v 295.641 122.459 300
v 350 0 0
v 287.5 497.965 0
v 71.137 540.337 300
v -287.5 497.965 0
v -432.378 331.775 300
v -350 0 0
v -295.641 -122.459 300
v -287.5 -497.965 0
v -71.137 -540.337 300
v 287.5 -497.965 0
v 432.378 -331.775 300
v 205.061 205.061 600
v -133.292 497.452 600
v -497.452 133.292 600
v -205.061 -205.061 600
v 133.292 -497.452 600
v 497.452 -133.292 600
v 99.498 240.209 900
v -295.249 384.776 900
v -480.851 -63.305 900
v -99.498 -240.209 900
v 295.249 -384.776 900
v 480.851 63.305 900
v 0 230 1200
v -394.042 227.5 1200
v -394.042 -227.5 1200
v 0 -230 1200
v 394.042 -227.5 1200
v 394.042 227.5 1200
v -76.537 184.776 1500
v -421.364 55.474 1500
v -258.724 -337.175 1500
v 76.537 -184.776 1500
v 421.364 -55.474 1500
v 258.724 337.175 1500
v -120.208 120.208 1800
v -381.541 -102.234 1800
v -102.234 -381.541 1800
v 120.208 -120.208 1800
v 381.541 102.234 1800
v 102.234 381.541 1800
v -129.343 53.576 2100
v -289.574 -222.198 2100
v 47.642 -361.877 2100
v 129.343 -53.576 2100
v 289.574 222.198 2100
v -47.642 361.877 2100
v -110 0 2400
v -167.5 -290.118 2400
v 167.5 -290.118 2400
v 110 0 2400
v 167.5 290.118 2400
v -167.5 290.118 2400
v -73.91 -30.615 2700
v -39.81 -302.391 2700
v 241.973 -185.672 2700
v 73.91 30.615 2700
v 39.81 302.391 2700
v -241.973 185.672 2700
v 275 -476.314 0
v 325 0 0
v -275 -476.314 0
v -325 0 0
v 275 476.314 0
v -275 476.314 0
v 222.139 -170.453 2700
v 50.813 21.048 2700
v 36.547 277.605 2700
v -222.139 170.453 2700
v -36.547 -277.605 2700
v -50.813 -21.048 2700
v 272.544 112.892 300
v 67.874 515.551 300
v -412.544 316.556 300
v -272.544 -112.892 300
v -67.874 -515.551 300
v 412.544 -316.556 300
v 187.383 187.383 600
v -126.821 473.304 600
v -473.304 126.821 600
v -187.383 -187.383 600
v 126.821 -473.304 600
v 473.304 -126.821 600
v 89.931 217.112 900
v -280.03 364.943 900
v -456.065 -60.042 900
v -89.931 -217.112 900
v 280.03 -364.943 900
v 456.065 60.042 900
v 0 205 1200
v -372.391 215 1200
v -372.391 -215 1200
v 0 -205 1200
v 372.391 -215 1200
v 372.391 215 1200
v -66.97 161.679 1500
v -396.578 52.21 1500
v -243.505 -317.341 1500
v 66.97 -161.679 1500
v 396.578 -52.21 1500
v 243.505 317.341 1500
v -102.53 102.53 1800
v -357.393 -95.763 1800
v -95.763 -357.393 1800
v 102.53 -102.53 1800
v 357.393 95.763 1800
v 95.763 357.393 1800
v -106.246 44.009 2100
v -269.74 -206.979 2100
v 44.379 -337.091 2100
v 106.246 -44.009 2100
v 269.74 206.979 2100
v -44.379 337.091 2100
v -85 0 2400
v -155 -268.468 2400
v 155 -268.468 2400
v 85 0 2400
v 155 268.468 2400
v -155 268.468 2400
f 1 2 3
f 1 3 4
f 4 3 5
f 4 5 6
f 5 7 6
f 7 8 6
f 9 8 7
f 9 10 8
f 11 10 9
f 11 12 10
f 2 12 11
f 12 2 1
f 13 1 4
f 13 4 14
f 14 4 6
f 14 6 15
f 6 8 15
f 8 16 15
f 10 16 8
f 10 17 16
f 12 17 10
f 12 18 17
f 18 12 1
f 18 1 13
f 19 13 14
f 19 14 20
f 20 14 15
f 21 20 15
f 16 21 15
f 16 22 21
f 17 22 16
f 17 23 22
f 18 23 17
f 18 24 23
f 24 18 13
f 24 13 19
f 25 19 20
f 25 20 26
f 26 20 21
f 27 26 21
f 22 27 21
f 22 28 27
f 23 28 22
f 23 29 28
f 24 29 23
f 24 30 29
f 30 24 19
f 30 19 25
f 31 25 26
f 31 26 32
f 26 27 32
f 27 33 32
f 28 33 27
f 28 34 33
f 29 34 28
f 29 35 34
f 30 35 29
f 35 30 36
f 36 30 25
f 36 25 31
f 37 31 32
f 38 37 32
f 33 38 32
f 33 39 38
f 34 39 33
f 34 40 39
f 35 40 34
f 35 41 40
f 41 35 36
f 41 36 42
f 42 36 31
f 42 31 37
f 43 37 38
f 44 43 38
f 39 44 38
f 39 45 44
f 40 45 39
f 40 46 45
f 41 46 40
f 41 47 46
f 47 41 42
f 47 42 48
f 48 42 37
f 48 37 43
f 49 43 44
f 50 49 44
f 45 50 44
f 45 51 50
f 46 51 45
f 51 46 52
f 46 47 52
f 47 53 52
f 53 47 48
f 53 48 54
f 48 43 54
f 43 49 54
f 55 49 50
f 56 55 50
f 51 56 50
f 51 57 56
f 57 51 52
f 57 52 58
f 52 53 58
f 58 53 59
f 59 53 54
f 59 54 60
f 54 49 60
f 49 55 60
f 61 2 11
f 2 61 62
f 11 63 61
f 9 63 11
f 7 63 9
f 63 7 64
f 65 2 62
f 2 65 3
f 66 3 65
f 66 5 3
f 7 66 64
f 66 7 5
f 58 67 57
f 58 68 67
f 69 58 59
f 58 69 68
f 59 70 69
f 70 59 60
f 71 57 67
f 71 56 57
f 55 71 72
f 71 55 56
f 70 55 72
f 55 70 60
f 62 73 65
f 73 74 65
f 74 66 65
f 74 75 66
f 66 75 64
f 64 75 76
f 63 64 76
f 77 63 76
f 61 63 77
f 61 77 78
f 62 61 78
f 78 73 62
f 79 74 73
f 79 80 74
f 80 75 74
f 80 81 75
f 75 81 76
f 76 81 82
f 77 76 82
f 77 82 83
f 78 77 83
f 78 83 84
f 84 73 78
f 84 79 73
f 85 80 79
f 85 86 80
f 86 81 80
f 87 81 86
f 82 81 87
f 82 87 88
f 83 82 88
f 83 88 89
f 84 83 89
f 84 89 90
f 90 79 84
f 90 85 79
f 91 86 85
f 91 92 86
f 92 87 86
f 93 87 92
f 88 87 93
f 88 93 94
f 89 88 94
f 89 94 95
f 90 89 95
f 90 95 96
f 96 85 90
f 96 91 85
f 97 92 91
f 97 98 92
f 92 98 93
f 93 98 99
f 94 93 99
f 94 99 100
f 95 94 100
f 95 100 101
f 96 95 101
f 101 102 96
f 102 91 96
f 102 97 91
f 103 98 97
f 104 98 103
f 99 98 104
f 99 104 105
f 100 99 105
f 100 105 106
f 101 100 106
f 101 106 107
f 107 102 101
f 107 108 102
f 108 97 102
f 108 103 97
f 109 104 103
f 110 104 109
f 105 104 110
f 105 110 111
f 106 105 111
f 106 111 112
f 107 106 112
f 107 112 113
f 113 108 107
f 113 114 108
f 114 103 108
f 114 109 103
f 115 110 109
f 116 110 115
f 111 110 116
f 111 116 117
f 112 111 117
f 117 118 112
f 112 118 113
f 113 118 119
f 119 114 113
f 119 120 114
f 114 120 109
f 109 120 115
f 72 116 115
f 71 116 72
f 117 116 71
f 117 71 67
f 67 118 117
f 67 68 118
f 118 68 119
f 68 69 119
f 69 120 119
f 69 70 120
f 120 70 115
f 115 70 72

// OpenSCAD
difference() {
	polyhedron(faces = [[0, 6, 1], [1, 6, 7], [1, 7, 2], [2, 7, 8], [2, 8, 3], [3, 8, 9], [3, 9, 4], [4, 9, 10], [4, 10, 5], [5, 10, 11], [5, 11, 0], [0, 11, 6], [6, 12, 7], [7, 12, 13], [7, 13, 8], [8, 13, 14], [8, 14, 9], [9, 14, 15], [9, 15, 10], [10, 15, 16], [10, 16, 11], [11, 16, 17], [11, 17, 6], [6, 17, 12], [12, 18, 13], [13, 18, 19], [13, 19, 14], [14, 19, 20], [14, 20, 15], [15, 20, 21], [15, 21, 16], [16, 21, 22], [16, 22, 17], [17, 22, 23], [17, 23, 12], [12, 23, 18], [18, 24, 19], [19, 24, 25], [19, 25, 20], [20, 25, 26], [20, 26, 21], [21, 26, 27], [21, 27, 22], [22, 27, 28], [22, 28, 23], [23, 28, 29], [23, 29, 18], [18, 29, 24], [24, 30, 25], [25, 30, 31], [25, 31, 26], [26, 31, 32], [26, 32, 27], [27, 32, 33], [27, 33, 28], [28, 33, 34], [28, 34, 29], [29, 34, 35], [29, 35, 24], [24, 35, 30], [30, 36, 31], [31, 36, 37], [31, 37, 32], [32, 37, 38], [32, 38, 33], [33, 38, 39], [33, 39, 34], [34, 39, 40], [34, 40, 35], [35, 40, 41], [35, 41, 30], [30, 41, 36], [36, 42, 37], [37, 42, 43], [37, 43, 38], [38, 43, 44], [38, 44, 39], [39, 44, 45], [39, 45, 40], [40, 45, 46], [40, 46, 41], [41, 46, 47], [41, 47, 36], [36, 47, 42], [42, 48, 43], [43, 48, 49], [43, 49, 44], [44, 49, 50], [44, 50, 45], [45, 50, 51], [45, 51, 46], [46, 51, 52], [46, 52, 47], [47, 52, 53], [47, 53, 42], [42, 53, 48], [48, 54, 49], [49, 54, 55], [49, 55, 50], [50, 55, 56], [50, 56, 51], [51, 56, 57], [51, 57, 52], [52, 57, 58], [52, 58, 53], [53, 58, 59], [53, 59, 48], [48, 59, 54], [1, 60, 0], [54, 61, 55], [2, 60, 1], [55, 61, 56], [3, 60, 2], [56, 61, 57], [4, 60, 3], [57, 61, 58], [5, 60, 4], [58, 61, 59], [0, 60, 5], [59, 61, 54]], points = [[350.0000000000, 0.0000000000, 0.0000000000], [287.5000000000, 497.9646071761, 0.0000000000], [-287.5000000000, 497.9646071761, 0.0000000000], [-350.0000000000, 0.0000000000, 0.0000000000], [-287.5000000000, -497.9646071761, 0.0000000000], [287.5000000000, -497.9646071761, 0.0000000000], [295.6414504036, 122.4586983568, 300.0000000000], [71.1367747599, 540.3374494487, 300.0000000000], [-432.3775704587, 331.7749788098, 300.0000000000], [-295.6414504036, -122.4586983568, 300.0000000000], [-71.1367747599, -540.3374494487, 300.0000000000], [432.3775704587, -331.7749788098, 300.0000000000], [205.0609665441, 205.0609665441, 600.0000000000], [-133.2918082278, 497.4518005389, 600.0000000000], [-497.4518005389, 133.2918082278, 600.0000000000], [-205.0609665441, -205.0609665441, 600.0000000000], [133.2918082278, -497.4518005389, 600.0000000000], [497.4518005389, -133.2918082278, 600.0000000000], [99.4976924149, 240.2086784529, 900.0000000000], [-295.2492930692, 384.7763700412, 900.0000000000], [-480.8507577663, -63.3052032267, 900.0000000000], [-99.4976924149, -240.2086784529, 900.0000000000], [295.2492930692, -384.7763700412, 900.0000000000], [480.8507577663, 63.3052032267, 900.0000000000], [0.0000000000, 230.0000000000, 1200.0000000000], [-394.0415587219, 227.5000000000, 1200.0000000000], [-394.0415587219, -227.5000000000, 1200.0000000000], [-0.0000000000, -230.0000000000, 1200.0000000000], [394.0415587219, -227.5000000000, 1200.0000000000], [394.0415587219, 227.5000000000, 1200.0000000000], [-76.5366864730, 184.7759065023, 1500.0000000000], [-421.3640660839, 55.4736316935, 1500.0000000000], [-258.7236073287, -337.1751696238, 1500.0000000000], [76.5366864730, -184.7759065023, 1500.0000000000], [421.3640660839, -55.4736316935, 1500.0000000000], [258.7236073287, 337.1751696238, 1500.0000000000], [-120.2081528017, 120.2081528017, 1800.0000000000], [-381.5407013842, -102.2335228155, 1800.0000000000], [-102.2335228155, -381.5407013842, 1800.0000000000], [120.2081528017, -120.2081528017, 1800.0000000000], [381.5407013842, 102.2335228155, 1800.0000000000], [102.2335228155, 381.5407013842, 1800.0000000000], [-129.3431345516, 53.5756805311, 2100.0000000000], [-289.5739692063, -222.1979215882, 2100.0000000000], [47.6420601603, -361.8773744014, 2100.0000000000], [129.3431345516, -53.5756805311, 2100.0000000000], [289.5739692063, 222.1979215882, 2100.0000000000], [-47.6420601603, 361.8773744014, 2100.0000000000], [-110.0000000000, 0.0000000000, 2400.0000000000], [-167.5000000000, -290.1185102678, 2400.0000000000], [167.5000000000, -290.1185102678, 2400.0000000000], [110.0000000000, -0.0000000000, 2400.0000000000], [167.5000000000, 290.1185102678, 2400.0000000000], [-167.5000000000, 290.1185102678, 2400.0000000000], [-73.9103626009, -30.6146745892, 2700.0000000000], [-39.8104886271, -302.3906827190, 2700.0000000000], [241.9727687888, -185.6722358477, 2700.0000000000], [73.9103626009, 30.6146745892, 2700.0000000000], [39.8104886271, 302.3906827190, 2700.0000000000], [-241.9727687888, 185.6722358477, 2700.0000000000], [-0.0000000000, 0.0000000000, 0.0000000000], [0.0000000000, 0.0000000000, 2700.0000000000]]);
	polyhedron(faces = [[0, 6, 1], [1, 6, 7], [1, 7, 2], [2, 7, 8], [2, 8, 3], [3, 8, 9], [3, 9, 4], [4, 9, 10], [4, 10, 5], [5, 10, 11], [5, 11, 0], [0, 11, 6], [6, 12, 7], [7, 12, 13], [7, 13, 8], [8, 13, 14], [8, 14, 9], [9, 14, 15], [9, 15, 10], [10, 15, 16], [10, 16, 11], [11, 16, 17], [11, 17, 6], [6, 17, 12], [12, 18, 13], [13, 18, 19], [13, 19, 14], [14, 19, 20], [14, 20, 15], [15, 20, 21], [15, 21, 16], [16, 21, 22], [16, 22, 17], [17, 22, 23], [17, 23, 12], [12, 23, 18], [18, 24, 19], [19, 24, 25], [19, 25, 20], [20, 25, 26], [20, 26, 21], [21, 26, 27], [21, 27, 22], [22, 27, 28], [22, 28, 23], [23, 28, 29], [23, 29, 18], [18, 29, 24], [24, 30, 25], [25, 30, 31], [25, 31, 26], [26, 31, 32], [26, 32, 27], [27, 32, 33], [27, 33, 28], [28, 33, 34], [28, 34, 29], [29, 34, 35], [29, 35, 24], [24, 35, 30], [30, 36, 31], [31, 36, 37], [31, 37, 32], [32, 37, 38], [32, 38, 33], [33, 38, 39], [33, 39, 34], [34, 39, 40], [34, 40, 35], [35, 40, 41], [35, 41, 30], [30, 41, 36], [36, 42, 37], [37, 42, 43], [37, 43, 38], [38, 43, 44], [38, 44, 39], [39, 44, 45], [39, 45, 40], [40, 45, 46], [40, 46, 41], [41, 46, 47], [41, 47, 36], [36, 47, 42], [42, 48, 43], [43, 48, 49], [43, 49, 44], [44, 49, 50], [44, 50, 45], [45, 50, 51], [45, 51, 46], [46, 51, 52], [46, 52, 47], [47, 52, 53], [47, 53, 42], [42, 53, 48], [48, 54, 49], [49, 54, 55], [49, 55, 50], [50, 55, 56], [50, 56, 51], [51, 56, 57], [51, 57, 52], [52, 57, 58], [52, 58, 53], [53, 58, 59], [53, 59, 48], [48, 59, 54], [1, 60, 0], [54, 61, 55], [2, 60, 1], [55, 61, 56], [3, 60, 2], [56, 61, 57], [4, 60, 3], [57, 61, 58], [5, 60, 4], [58, 61, 59], [0, 60, 5], [59, 61, 54]], points = [[325.0000000000, 0.0000000000, 0.0000000000], [275.0000000000, 476.3139720814, 0.0000000000], [-275.0000000000, 476.3139720814, 0.0000000000], [-325.0000000000, 0.0000000000, 0.0000000000], [-275.0000000000, -476.3139720814, 0.0000000000], [275.0000000000, -476.3139720814, 0.0000000000], [272.5444620908, 112.8916125477, 300.0000000000], [67.8736199544, 515.5513279144, 300.0000000000], [-412.5437369514, 316.5559430845, 300.0000000000], [-272.5444620908, -112.8916125477, 300.0000000000], [-67.8736199544, -515.5513279144, 300.0000000000], [412.5437369514, -316.5559430845, 300.0000000000], [187.3832970144, 187.3832970144, 600.0000000000], [-126.8213321002, 473.3036548816, 600.0000000000], [-473.3036548816, 126.8213321002, 600.0000000000], [-187.3832970144, -187.3832970144, 600.0000000000], [126.8213321002, -473.3036548816, 600.0000000000], [473.3036548816, -126.8213321002, 600.0000000000], [89.9306066058, 217.1116901402, 900.0000000000], [-280.0302573440, 364.9425365340, 900.0000000000], [-456.0646362320, -60.0420484212, 900.0000000000], [-89.9306066058, -217.1116901402, 900.0000000000], [280.0302573440, -364.9425365340, 900.0000000000], [456.0646362320, 60.0420484212, 900.0000000000], [0.0000000000, 205.0000000000, 1200.0000000000], [-372.3909236273, 215.0000000000, 1200.0000000000], [-372.3909236273, -215.0000000000, 1200.0000000000], [-0.0000000000, -205.0000000000, 1200.0000000000], [372.3909236273, -215.0000000000, 1200.0000000000], [372.3909236273, 215.0000000000, 1200.0000000000], [-66.9696006639, 161.6789181895, 1500.0000000000], [-396.5779445495, 52.2104768880, 1500.0000000000], [-243.5045716035, -317.3413361165, 1500.0000000000], [66.9696006639, -161.6789181895, 1500.0000000000], [396.5779445495, -52.2104768880, 1500.0000000000], [243.5045716035, 317.3413361165, 1500.0000000000], [-102.5304832720, 102.5304832720, 1800.0000000000], [-357.3925557270, -95.7630466879, 1800.0000000000], [-95.7630466879, -357.3925557270, 1800.0000000000], [102.5304832720, -102.5304832720, 1800.0000000000], [357.3925557270, 95.7630466879, 1800.0000000000], [95.7630466879, 357.3925557270, 1800.0000000000], [-106.2461462388, 44.0085947220, 2100.0000000000], [-269.7401356990, -206.9788858630, 2100.0000000000], [44.3789053548, -337.0912528671, 2100.0000000000], [106.2461462388, -44.0085947220, 2100.0000000000], [269.7401356990, 206.9788858630, 2100.0000000000], [-44.3789053548, 337.0912528671, 2100.0000000000], [-85.0000000000, 0.0000000000, 2400.0000000000], [-155.0000000000, -268.4678751732, 2400.0000000000], [155.0000000000, -268.4678751732, 2400.0000000000], [85.0000000000, -0.0000000000, 2400.0000000000], [155.0000000000, 268.4678751732, 2400.0000000000], [-155.0000000000, 268.4678751732, 2400.0000000000], [-50.8133742881, -21.0475887801, 2700.0000000000], [-36.5473338216, -277.6045611847, 2700.0000000000], [222.1389352815, -170.4532001224, 2700.0000000000], [50.8133742881, 21.0475887801, 2700.0000000000], [36.5473338216, 277.6045611847, 2700.0000000000], [-222.1389352815, 170.4532001224, 2700.0000000000], [-0.0000000000, -0.0000000000, 0.0000000000], [0.0000000000, -0.0000000000, 2700.0000000000]]);
}
